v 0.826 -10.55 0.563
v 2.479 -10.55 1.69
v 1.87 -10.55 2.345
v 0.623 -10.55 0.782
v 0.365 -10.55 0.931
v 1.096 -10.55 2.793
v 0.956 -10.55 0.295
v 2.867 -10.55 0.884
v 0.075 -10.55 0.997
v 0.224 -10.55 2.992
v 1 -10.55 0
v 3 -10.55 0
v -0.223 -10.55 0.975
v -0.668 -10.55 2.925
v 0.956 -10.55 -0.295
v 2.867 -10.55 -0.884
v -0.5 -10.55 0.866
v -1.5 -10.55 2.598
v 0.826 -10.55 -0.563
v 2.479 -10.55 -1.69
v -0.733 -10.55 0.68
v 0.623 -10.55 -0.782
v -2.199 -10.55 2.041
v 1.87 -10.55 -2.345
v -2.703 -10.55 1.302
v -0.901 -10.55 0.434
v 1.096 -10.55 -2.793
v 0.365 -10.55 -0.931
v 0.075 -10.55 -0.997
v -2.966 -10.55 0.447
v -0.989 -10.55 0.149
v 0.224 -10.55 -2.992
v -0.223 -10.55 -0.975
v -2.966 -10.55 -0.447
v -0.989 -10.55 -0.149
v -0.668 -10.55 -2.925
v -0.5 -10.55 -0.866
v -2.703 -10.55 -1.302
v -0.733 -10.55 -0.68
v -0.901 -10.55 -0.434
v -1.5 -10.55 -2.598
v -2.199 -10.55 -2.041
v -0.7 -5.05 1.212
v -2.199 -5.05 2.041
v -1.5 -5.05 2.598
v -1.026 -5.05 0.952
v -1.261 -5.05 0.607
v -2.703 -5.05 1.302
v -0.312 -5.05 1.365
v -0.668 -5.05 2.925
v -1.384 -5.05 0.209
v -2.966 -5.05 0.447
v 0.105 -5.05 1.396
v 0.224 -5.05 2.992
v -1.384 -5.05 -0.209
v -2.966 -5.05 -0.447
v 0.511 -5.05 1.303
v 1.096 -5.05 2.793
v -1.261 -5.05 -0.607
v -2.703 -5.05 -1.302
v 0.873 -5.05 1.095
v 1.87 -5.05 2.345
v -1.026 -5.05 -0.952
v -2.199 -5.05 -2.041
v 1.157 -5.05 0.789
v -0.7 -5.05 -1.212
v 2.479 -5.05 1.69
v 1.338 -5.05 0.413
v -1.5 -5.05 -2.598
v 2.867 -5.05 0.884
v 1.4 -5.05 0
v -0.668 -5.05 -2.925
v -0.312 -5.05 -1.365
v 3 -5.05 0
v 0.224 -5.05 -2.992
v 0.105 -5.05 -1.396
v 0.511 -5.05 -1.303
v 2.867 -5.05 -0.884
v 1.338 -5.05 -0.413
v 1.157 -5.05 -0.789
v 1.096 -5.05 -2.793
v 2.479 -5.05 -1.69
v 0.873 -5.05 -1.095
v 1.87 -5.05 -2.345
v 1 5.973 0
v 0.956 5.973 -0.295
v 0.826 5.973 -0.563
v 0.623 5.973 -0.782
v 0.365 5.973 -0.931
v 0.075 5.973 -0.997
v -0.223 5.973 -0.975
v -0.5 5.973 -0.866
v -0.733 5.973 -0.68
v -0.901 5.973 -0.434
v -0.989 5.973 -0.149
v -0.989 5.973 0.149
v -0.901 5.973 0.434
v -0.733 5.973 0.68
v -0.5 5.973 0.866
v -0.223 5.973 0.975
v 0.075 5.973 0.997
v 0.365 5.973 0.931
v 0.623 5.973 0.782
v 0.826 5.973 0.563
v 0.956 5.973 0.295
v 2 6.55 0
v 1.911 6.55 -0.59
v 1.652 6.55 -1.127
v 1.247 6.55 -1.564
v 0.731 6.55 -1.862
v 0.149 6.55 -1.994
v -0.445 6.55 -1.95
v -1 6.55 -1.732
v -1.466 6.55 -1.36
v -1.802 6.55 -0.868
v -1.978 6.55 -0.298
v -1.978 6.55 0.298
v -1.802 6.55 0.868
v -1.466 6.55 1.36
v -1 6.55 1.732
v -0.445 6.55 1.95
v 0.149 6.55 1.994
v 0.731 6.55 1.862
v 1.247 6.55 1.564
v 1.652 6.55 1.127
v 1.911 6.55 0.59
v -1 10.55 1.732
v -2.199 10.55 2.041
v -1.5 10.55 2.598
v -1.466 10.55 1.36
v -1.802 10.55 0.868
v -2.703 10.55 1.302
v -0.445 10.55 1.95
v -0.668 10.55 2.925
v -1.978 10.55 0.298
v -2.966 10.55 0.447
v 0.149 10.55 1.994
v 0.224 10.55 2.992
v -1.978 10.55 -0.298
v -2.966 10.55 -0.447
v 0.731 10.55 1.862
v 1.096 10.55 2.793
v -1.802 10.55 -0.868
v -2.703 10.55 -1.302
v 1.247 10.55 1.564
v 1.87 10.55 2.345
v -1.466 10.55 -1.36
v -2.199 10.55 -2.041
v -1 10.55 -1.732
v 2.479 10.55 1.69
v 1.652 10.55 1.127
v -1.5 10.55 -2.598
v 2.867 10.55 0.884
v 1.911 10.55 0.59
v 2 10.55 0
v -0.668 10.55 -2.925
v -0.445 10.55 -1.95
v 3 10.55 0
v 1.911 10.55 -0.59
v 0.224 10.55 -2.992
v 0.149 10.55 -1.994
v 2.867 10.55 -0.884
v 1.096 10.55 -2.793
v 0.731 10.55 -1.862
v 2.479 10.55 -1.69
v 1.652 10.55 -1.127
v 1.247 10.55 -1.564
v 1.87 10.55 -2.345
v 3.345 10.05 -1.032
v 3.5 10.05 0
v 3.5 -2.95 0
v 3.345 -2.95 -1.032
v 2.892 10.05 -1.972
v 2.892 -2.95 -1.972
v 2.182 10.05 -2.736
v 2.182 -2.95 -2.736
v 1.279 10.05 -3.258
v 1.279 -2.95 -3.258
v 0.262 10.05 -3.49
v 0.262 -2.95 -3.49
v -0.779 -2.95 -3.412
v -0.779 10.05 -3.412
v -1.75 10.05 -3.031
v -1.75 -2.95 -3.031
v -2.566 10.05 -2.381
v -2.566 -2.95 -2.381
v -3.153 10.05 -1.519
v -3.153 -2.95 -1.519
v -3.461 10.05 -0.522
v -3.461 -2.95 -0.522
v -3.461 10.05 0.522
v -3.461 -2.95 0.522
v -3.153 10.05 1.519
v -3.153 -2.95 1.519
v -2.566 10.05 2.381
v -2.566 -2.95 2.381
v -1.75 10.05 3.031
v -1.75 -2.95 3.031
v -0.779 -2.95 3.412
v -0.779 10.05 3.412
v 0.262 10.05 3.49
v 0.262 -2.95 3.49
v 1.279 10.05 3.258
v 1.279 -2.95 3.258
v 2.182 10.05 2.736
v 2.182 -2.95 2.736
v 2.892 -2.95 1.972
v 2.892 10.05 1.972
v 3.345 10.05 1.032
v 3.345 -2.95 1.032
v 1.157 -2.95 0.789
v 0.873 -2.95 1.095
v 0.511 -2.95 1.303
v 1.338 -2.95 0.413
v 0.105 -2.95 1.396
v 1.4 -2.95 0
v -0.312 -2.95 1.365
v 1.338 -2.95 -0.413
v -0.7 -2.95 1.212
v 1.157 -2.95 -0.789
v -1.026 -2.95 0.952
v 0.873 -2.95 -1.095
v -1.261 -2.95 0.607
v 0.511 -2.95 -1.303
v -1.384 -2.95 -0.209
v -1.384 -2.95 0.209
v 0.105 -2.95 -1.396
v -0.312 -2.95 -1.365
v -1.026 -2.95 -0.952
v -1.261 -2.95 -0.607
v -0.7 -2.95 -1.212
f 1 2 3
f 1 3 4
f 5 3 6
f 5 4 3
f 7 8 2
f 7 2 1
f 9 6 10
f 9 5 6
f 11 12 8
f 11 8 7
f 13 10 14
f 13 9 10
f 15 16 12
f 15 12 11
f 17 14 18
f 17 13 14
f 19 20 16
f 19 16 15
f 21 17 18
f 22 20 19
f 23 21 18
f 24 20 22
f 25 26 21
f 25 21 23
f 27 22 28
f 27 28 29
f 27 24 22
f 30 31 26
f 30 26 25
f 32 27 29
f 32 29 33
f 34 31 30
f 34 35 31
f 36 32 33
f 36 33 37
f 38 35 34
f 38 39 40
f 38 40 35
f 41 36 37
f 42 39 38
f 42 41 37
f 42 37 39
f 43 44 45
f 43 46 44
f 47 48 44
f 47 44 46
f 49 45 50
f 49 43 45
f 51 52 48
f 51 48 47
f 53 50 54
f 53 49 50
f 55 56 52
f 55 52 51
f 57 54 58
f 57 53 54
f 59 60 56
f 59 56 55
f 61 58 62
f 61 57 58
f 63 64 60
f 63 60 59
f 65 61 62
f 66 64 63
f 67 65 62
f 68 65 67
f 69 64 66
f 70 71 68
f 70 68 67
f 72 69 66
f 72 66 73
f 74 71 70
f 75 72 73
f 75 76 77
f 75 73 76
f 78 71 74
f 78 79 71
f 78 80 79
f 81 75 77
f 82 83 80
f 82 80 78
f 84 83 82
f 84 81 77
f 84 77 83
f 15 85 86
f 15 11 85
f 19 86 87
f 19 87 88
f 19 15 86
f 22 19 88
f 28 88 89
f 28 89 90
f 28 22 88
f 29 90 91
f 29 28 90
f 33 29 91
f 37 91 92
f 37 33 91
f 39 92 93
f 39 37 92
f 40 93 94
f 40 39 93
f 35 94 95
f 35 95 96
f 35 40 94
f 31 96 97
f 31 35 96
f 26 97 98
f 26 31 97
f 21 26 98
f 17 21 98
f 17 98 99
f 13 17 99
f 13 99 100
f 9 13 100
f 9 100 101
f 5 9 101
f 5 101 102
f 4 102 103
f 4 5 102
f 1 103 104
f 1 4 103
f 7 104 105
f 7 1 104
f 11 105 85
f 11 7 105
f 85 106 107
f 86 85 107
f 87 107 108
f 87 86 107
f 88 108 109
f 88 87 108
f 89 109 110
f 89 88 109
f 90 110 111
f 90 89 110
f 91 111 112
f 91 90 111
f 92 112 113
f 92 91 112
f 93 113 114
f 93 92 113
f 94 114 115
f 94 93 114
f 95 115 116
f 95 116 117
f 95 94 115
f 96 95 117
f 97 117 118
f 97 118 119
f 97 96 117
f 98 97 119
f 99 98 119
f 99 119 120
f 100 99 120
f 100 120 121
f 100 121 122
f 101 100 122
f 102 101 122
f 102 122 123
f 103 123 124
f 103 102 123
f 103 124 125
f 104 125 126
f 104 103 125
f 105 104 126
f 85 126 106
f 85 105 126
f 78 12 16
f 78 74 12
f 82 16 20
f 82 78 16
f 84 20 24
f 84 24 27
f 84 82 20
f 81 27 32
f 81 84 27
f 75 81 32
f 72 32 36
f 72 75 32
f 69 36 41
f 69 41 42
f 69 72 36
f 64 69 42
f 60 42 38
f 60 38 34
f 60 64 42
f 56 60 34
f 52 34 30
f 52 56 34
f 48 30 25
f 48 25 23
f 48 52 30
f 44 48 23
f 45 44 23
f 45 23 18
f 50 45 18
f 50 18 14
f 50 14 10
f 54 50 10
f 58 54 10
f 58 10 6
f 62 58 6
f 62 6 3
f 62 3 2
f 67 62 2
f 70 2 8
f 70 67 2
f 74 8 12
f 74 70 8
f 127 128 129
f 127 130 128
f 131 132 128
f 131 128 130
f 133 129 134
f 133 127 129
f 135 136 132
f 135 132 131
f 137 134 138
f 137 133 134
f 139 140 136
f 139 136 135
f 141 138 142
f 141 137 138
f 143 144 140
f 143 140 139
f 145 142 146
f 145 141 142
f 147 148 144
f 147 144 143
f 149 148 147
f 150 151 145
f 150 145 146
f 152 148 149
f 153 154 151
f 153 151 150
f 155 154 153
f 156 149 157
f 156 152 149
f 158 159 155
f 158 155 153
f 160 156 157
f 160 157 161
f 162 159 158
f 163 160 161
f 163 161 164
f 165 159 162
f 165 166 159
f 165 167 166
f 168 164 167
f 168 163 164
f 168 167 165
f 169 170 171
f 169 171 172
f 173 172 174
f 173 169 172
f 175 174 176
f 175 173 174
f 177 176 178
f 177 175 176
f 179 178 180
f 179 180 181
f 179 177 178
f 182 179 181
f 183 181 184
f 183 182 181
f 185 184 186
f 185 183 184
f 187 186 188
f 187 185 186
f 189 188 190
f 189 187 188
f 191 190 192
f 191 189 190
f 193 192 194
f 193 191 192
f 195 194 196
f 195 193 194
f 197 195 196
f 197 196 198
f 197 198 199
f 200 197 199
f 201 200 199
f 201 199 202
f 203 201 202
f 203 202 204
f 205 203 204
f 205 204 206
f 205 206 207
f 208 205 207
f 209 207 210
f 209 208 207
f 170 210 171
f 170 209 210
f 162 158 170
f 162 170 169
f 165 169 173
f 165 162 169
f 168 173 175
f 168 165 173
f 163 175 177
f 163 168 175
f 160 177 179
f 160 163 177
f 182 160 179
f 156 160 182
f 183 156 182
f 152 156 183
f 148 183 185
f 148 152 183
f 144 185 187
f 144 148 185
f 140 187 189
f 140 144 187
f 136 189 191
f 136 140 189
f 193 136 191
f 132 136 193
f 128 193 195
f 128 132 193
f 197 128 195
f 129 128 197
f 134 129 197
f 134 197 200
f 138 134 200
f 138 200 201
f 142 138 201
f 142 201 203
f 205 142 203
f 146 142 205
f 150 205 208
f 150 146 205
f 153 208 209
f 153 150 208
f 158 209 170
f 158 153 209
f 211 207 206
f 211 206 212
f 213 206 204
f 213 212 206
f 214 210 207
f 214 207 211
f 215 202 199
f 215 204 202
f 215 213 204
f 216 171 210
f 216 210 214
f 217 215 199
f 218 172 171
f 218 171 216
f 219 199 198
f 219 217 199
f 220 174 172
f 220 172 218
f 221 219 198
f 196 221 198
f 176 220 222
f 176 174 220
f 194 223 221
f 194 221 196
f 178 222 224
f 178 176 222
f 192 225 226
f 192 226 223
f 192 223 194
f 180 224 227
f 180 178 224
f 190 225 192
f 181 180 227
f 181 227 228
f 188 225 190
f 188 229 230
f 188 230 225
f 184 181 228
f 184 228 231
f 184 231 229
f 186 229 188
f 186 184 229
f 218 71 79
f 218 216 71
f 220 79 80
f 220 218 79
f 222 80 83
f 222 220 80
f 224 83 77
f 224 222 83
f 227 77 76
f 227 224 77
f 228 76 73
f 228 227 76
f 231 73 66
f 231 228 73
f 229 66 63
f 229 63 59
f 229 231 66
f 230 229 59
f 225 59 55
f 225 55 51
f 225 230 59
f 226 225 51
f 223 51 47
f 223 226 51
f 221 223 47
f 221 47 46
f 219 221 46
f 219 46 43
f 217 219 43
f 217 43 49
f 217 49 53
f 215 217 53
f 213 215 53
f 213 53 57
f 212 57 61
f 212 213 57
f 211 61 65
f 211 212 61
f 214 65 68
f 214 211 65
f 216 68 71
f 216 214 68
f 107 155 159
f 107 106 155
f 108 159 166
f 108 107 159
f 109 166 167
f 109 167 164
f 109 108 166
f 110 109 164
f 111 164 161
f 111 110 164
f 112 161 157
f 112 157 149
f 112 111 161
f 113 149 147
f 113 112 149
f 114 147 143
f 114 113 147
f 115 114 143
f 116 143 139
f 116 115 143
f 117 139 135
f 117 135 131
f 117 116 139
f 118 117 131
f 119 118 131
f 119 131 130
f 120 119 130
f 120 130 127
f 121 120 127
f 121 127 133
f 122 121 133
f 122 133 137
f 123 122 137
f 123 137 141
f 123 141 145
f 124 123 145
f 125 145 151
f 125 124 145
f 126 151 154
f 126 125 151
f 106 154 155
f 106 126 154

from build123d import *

# Parameters (mm, degrees)
CHAMFER1_SIZE = 0.5


with BuildPart() as part:
    # Sketch1 → Revolve1 (revolve)
    with BuildSketch(Plane.XY):
        Polygon((1, -10.55), (3, -10.55), (3, -5.05), (1.4, -5.05), (1.4, -2.95), (3.5, -2.95), (3.5, 10.55), (2, 10.55), (2, 6.55), (1, 5.972649731), align=None)
    revolve(axis=Axis((0, -10.55, 0), (0, 1, 0)))

    # Chamfer1
    chamfer1_edges = [part.edges().sort_by_distance(p)[0] for p in [
        (-3.5, 10.55, 0),
    ]]
    chamfer(chamfer1_edges, length=CHAMFER1_SIZE)


solid = part.part
